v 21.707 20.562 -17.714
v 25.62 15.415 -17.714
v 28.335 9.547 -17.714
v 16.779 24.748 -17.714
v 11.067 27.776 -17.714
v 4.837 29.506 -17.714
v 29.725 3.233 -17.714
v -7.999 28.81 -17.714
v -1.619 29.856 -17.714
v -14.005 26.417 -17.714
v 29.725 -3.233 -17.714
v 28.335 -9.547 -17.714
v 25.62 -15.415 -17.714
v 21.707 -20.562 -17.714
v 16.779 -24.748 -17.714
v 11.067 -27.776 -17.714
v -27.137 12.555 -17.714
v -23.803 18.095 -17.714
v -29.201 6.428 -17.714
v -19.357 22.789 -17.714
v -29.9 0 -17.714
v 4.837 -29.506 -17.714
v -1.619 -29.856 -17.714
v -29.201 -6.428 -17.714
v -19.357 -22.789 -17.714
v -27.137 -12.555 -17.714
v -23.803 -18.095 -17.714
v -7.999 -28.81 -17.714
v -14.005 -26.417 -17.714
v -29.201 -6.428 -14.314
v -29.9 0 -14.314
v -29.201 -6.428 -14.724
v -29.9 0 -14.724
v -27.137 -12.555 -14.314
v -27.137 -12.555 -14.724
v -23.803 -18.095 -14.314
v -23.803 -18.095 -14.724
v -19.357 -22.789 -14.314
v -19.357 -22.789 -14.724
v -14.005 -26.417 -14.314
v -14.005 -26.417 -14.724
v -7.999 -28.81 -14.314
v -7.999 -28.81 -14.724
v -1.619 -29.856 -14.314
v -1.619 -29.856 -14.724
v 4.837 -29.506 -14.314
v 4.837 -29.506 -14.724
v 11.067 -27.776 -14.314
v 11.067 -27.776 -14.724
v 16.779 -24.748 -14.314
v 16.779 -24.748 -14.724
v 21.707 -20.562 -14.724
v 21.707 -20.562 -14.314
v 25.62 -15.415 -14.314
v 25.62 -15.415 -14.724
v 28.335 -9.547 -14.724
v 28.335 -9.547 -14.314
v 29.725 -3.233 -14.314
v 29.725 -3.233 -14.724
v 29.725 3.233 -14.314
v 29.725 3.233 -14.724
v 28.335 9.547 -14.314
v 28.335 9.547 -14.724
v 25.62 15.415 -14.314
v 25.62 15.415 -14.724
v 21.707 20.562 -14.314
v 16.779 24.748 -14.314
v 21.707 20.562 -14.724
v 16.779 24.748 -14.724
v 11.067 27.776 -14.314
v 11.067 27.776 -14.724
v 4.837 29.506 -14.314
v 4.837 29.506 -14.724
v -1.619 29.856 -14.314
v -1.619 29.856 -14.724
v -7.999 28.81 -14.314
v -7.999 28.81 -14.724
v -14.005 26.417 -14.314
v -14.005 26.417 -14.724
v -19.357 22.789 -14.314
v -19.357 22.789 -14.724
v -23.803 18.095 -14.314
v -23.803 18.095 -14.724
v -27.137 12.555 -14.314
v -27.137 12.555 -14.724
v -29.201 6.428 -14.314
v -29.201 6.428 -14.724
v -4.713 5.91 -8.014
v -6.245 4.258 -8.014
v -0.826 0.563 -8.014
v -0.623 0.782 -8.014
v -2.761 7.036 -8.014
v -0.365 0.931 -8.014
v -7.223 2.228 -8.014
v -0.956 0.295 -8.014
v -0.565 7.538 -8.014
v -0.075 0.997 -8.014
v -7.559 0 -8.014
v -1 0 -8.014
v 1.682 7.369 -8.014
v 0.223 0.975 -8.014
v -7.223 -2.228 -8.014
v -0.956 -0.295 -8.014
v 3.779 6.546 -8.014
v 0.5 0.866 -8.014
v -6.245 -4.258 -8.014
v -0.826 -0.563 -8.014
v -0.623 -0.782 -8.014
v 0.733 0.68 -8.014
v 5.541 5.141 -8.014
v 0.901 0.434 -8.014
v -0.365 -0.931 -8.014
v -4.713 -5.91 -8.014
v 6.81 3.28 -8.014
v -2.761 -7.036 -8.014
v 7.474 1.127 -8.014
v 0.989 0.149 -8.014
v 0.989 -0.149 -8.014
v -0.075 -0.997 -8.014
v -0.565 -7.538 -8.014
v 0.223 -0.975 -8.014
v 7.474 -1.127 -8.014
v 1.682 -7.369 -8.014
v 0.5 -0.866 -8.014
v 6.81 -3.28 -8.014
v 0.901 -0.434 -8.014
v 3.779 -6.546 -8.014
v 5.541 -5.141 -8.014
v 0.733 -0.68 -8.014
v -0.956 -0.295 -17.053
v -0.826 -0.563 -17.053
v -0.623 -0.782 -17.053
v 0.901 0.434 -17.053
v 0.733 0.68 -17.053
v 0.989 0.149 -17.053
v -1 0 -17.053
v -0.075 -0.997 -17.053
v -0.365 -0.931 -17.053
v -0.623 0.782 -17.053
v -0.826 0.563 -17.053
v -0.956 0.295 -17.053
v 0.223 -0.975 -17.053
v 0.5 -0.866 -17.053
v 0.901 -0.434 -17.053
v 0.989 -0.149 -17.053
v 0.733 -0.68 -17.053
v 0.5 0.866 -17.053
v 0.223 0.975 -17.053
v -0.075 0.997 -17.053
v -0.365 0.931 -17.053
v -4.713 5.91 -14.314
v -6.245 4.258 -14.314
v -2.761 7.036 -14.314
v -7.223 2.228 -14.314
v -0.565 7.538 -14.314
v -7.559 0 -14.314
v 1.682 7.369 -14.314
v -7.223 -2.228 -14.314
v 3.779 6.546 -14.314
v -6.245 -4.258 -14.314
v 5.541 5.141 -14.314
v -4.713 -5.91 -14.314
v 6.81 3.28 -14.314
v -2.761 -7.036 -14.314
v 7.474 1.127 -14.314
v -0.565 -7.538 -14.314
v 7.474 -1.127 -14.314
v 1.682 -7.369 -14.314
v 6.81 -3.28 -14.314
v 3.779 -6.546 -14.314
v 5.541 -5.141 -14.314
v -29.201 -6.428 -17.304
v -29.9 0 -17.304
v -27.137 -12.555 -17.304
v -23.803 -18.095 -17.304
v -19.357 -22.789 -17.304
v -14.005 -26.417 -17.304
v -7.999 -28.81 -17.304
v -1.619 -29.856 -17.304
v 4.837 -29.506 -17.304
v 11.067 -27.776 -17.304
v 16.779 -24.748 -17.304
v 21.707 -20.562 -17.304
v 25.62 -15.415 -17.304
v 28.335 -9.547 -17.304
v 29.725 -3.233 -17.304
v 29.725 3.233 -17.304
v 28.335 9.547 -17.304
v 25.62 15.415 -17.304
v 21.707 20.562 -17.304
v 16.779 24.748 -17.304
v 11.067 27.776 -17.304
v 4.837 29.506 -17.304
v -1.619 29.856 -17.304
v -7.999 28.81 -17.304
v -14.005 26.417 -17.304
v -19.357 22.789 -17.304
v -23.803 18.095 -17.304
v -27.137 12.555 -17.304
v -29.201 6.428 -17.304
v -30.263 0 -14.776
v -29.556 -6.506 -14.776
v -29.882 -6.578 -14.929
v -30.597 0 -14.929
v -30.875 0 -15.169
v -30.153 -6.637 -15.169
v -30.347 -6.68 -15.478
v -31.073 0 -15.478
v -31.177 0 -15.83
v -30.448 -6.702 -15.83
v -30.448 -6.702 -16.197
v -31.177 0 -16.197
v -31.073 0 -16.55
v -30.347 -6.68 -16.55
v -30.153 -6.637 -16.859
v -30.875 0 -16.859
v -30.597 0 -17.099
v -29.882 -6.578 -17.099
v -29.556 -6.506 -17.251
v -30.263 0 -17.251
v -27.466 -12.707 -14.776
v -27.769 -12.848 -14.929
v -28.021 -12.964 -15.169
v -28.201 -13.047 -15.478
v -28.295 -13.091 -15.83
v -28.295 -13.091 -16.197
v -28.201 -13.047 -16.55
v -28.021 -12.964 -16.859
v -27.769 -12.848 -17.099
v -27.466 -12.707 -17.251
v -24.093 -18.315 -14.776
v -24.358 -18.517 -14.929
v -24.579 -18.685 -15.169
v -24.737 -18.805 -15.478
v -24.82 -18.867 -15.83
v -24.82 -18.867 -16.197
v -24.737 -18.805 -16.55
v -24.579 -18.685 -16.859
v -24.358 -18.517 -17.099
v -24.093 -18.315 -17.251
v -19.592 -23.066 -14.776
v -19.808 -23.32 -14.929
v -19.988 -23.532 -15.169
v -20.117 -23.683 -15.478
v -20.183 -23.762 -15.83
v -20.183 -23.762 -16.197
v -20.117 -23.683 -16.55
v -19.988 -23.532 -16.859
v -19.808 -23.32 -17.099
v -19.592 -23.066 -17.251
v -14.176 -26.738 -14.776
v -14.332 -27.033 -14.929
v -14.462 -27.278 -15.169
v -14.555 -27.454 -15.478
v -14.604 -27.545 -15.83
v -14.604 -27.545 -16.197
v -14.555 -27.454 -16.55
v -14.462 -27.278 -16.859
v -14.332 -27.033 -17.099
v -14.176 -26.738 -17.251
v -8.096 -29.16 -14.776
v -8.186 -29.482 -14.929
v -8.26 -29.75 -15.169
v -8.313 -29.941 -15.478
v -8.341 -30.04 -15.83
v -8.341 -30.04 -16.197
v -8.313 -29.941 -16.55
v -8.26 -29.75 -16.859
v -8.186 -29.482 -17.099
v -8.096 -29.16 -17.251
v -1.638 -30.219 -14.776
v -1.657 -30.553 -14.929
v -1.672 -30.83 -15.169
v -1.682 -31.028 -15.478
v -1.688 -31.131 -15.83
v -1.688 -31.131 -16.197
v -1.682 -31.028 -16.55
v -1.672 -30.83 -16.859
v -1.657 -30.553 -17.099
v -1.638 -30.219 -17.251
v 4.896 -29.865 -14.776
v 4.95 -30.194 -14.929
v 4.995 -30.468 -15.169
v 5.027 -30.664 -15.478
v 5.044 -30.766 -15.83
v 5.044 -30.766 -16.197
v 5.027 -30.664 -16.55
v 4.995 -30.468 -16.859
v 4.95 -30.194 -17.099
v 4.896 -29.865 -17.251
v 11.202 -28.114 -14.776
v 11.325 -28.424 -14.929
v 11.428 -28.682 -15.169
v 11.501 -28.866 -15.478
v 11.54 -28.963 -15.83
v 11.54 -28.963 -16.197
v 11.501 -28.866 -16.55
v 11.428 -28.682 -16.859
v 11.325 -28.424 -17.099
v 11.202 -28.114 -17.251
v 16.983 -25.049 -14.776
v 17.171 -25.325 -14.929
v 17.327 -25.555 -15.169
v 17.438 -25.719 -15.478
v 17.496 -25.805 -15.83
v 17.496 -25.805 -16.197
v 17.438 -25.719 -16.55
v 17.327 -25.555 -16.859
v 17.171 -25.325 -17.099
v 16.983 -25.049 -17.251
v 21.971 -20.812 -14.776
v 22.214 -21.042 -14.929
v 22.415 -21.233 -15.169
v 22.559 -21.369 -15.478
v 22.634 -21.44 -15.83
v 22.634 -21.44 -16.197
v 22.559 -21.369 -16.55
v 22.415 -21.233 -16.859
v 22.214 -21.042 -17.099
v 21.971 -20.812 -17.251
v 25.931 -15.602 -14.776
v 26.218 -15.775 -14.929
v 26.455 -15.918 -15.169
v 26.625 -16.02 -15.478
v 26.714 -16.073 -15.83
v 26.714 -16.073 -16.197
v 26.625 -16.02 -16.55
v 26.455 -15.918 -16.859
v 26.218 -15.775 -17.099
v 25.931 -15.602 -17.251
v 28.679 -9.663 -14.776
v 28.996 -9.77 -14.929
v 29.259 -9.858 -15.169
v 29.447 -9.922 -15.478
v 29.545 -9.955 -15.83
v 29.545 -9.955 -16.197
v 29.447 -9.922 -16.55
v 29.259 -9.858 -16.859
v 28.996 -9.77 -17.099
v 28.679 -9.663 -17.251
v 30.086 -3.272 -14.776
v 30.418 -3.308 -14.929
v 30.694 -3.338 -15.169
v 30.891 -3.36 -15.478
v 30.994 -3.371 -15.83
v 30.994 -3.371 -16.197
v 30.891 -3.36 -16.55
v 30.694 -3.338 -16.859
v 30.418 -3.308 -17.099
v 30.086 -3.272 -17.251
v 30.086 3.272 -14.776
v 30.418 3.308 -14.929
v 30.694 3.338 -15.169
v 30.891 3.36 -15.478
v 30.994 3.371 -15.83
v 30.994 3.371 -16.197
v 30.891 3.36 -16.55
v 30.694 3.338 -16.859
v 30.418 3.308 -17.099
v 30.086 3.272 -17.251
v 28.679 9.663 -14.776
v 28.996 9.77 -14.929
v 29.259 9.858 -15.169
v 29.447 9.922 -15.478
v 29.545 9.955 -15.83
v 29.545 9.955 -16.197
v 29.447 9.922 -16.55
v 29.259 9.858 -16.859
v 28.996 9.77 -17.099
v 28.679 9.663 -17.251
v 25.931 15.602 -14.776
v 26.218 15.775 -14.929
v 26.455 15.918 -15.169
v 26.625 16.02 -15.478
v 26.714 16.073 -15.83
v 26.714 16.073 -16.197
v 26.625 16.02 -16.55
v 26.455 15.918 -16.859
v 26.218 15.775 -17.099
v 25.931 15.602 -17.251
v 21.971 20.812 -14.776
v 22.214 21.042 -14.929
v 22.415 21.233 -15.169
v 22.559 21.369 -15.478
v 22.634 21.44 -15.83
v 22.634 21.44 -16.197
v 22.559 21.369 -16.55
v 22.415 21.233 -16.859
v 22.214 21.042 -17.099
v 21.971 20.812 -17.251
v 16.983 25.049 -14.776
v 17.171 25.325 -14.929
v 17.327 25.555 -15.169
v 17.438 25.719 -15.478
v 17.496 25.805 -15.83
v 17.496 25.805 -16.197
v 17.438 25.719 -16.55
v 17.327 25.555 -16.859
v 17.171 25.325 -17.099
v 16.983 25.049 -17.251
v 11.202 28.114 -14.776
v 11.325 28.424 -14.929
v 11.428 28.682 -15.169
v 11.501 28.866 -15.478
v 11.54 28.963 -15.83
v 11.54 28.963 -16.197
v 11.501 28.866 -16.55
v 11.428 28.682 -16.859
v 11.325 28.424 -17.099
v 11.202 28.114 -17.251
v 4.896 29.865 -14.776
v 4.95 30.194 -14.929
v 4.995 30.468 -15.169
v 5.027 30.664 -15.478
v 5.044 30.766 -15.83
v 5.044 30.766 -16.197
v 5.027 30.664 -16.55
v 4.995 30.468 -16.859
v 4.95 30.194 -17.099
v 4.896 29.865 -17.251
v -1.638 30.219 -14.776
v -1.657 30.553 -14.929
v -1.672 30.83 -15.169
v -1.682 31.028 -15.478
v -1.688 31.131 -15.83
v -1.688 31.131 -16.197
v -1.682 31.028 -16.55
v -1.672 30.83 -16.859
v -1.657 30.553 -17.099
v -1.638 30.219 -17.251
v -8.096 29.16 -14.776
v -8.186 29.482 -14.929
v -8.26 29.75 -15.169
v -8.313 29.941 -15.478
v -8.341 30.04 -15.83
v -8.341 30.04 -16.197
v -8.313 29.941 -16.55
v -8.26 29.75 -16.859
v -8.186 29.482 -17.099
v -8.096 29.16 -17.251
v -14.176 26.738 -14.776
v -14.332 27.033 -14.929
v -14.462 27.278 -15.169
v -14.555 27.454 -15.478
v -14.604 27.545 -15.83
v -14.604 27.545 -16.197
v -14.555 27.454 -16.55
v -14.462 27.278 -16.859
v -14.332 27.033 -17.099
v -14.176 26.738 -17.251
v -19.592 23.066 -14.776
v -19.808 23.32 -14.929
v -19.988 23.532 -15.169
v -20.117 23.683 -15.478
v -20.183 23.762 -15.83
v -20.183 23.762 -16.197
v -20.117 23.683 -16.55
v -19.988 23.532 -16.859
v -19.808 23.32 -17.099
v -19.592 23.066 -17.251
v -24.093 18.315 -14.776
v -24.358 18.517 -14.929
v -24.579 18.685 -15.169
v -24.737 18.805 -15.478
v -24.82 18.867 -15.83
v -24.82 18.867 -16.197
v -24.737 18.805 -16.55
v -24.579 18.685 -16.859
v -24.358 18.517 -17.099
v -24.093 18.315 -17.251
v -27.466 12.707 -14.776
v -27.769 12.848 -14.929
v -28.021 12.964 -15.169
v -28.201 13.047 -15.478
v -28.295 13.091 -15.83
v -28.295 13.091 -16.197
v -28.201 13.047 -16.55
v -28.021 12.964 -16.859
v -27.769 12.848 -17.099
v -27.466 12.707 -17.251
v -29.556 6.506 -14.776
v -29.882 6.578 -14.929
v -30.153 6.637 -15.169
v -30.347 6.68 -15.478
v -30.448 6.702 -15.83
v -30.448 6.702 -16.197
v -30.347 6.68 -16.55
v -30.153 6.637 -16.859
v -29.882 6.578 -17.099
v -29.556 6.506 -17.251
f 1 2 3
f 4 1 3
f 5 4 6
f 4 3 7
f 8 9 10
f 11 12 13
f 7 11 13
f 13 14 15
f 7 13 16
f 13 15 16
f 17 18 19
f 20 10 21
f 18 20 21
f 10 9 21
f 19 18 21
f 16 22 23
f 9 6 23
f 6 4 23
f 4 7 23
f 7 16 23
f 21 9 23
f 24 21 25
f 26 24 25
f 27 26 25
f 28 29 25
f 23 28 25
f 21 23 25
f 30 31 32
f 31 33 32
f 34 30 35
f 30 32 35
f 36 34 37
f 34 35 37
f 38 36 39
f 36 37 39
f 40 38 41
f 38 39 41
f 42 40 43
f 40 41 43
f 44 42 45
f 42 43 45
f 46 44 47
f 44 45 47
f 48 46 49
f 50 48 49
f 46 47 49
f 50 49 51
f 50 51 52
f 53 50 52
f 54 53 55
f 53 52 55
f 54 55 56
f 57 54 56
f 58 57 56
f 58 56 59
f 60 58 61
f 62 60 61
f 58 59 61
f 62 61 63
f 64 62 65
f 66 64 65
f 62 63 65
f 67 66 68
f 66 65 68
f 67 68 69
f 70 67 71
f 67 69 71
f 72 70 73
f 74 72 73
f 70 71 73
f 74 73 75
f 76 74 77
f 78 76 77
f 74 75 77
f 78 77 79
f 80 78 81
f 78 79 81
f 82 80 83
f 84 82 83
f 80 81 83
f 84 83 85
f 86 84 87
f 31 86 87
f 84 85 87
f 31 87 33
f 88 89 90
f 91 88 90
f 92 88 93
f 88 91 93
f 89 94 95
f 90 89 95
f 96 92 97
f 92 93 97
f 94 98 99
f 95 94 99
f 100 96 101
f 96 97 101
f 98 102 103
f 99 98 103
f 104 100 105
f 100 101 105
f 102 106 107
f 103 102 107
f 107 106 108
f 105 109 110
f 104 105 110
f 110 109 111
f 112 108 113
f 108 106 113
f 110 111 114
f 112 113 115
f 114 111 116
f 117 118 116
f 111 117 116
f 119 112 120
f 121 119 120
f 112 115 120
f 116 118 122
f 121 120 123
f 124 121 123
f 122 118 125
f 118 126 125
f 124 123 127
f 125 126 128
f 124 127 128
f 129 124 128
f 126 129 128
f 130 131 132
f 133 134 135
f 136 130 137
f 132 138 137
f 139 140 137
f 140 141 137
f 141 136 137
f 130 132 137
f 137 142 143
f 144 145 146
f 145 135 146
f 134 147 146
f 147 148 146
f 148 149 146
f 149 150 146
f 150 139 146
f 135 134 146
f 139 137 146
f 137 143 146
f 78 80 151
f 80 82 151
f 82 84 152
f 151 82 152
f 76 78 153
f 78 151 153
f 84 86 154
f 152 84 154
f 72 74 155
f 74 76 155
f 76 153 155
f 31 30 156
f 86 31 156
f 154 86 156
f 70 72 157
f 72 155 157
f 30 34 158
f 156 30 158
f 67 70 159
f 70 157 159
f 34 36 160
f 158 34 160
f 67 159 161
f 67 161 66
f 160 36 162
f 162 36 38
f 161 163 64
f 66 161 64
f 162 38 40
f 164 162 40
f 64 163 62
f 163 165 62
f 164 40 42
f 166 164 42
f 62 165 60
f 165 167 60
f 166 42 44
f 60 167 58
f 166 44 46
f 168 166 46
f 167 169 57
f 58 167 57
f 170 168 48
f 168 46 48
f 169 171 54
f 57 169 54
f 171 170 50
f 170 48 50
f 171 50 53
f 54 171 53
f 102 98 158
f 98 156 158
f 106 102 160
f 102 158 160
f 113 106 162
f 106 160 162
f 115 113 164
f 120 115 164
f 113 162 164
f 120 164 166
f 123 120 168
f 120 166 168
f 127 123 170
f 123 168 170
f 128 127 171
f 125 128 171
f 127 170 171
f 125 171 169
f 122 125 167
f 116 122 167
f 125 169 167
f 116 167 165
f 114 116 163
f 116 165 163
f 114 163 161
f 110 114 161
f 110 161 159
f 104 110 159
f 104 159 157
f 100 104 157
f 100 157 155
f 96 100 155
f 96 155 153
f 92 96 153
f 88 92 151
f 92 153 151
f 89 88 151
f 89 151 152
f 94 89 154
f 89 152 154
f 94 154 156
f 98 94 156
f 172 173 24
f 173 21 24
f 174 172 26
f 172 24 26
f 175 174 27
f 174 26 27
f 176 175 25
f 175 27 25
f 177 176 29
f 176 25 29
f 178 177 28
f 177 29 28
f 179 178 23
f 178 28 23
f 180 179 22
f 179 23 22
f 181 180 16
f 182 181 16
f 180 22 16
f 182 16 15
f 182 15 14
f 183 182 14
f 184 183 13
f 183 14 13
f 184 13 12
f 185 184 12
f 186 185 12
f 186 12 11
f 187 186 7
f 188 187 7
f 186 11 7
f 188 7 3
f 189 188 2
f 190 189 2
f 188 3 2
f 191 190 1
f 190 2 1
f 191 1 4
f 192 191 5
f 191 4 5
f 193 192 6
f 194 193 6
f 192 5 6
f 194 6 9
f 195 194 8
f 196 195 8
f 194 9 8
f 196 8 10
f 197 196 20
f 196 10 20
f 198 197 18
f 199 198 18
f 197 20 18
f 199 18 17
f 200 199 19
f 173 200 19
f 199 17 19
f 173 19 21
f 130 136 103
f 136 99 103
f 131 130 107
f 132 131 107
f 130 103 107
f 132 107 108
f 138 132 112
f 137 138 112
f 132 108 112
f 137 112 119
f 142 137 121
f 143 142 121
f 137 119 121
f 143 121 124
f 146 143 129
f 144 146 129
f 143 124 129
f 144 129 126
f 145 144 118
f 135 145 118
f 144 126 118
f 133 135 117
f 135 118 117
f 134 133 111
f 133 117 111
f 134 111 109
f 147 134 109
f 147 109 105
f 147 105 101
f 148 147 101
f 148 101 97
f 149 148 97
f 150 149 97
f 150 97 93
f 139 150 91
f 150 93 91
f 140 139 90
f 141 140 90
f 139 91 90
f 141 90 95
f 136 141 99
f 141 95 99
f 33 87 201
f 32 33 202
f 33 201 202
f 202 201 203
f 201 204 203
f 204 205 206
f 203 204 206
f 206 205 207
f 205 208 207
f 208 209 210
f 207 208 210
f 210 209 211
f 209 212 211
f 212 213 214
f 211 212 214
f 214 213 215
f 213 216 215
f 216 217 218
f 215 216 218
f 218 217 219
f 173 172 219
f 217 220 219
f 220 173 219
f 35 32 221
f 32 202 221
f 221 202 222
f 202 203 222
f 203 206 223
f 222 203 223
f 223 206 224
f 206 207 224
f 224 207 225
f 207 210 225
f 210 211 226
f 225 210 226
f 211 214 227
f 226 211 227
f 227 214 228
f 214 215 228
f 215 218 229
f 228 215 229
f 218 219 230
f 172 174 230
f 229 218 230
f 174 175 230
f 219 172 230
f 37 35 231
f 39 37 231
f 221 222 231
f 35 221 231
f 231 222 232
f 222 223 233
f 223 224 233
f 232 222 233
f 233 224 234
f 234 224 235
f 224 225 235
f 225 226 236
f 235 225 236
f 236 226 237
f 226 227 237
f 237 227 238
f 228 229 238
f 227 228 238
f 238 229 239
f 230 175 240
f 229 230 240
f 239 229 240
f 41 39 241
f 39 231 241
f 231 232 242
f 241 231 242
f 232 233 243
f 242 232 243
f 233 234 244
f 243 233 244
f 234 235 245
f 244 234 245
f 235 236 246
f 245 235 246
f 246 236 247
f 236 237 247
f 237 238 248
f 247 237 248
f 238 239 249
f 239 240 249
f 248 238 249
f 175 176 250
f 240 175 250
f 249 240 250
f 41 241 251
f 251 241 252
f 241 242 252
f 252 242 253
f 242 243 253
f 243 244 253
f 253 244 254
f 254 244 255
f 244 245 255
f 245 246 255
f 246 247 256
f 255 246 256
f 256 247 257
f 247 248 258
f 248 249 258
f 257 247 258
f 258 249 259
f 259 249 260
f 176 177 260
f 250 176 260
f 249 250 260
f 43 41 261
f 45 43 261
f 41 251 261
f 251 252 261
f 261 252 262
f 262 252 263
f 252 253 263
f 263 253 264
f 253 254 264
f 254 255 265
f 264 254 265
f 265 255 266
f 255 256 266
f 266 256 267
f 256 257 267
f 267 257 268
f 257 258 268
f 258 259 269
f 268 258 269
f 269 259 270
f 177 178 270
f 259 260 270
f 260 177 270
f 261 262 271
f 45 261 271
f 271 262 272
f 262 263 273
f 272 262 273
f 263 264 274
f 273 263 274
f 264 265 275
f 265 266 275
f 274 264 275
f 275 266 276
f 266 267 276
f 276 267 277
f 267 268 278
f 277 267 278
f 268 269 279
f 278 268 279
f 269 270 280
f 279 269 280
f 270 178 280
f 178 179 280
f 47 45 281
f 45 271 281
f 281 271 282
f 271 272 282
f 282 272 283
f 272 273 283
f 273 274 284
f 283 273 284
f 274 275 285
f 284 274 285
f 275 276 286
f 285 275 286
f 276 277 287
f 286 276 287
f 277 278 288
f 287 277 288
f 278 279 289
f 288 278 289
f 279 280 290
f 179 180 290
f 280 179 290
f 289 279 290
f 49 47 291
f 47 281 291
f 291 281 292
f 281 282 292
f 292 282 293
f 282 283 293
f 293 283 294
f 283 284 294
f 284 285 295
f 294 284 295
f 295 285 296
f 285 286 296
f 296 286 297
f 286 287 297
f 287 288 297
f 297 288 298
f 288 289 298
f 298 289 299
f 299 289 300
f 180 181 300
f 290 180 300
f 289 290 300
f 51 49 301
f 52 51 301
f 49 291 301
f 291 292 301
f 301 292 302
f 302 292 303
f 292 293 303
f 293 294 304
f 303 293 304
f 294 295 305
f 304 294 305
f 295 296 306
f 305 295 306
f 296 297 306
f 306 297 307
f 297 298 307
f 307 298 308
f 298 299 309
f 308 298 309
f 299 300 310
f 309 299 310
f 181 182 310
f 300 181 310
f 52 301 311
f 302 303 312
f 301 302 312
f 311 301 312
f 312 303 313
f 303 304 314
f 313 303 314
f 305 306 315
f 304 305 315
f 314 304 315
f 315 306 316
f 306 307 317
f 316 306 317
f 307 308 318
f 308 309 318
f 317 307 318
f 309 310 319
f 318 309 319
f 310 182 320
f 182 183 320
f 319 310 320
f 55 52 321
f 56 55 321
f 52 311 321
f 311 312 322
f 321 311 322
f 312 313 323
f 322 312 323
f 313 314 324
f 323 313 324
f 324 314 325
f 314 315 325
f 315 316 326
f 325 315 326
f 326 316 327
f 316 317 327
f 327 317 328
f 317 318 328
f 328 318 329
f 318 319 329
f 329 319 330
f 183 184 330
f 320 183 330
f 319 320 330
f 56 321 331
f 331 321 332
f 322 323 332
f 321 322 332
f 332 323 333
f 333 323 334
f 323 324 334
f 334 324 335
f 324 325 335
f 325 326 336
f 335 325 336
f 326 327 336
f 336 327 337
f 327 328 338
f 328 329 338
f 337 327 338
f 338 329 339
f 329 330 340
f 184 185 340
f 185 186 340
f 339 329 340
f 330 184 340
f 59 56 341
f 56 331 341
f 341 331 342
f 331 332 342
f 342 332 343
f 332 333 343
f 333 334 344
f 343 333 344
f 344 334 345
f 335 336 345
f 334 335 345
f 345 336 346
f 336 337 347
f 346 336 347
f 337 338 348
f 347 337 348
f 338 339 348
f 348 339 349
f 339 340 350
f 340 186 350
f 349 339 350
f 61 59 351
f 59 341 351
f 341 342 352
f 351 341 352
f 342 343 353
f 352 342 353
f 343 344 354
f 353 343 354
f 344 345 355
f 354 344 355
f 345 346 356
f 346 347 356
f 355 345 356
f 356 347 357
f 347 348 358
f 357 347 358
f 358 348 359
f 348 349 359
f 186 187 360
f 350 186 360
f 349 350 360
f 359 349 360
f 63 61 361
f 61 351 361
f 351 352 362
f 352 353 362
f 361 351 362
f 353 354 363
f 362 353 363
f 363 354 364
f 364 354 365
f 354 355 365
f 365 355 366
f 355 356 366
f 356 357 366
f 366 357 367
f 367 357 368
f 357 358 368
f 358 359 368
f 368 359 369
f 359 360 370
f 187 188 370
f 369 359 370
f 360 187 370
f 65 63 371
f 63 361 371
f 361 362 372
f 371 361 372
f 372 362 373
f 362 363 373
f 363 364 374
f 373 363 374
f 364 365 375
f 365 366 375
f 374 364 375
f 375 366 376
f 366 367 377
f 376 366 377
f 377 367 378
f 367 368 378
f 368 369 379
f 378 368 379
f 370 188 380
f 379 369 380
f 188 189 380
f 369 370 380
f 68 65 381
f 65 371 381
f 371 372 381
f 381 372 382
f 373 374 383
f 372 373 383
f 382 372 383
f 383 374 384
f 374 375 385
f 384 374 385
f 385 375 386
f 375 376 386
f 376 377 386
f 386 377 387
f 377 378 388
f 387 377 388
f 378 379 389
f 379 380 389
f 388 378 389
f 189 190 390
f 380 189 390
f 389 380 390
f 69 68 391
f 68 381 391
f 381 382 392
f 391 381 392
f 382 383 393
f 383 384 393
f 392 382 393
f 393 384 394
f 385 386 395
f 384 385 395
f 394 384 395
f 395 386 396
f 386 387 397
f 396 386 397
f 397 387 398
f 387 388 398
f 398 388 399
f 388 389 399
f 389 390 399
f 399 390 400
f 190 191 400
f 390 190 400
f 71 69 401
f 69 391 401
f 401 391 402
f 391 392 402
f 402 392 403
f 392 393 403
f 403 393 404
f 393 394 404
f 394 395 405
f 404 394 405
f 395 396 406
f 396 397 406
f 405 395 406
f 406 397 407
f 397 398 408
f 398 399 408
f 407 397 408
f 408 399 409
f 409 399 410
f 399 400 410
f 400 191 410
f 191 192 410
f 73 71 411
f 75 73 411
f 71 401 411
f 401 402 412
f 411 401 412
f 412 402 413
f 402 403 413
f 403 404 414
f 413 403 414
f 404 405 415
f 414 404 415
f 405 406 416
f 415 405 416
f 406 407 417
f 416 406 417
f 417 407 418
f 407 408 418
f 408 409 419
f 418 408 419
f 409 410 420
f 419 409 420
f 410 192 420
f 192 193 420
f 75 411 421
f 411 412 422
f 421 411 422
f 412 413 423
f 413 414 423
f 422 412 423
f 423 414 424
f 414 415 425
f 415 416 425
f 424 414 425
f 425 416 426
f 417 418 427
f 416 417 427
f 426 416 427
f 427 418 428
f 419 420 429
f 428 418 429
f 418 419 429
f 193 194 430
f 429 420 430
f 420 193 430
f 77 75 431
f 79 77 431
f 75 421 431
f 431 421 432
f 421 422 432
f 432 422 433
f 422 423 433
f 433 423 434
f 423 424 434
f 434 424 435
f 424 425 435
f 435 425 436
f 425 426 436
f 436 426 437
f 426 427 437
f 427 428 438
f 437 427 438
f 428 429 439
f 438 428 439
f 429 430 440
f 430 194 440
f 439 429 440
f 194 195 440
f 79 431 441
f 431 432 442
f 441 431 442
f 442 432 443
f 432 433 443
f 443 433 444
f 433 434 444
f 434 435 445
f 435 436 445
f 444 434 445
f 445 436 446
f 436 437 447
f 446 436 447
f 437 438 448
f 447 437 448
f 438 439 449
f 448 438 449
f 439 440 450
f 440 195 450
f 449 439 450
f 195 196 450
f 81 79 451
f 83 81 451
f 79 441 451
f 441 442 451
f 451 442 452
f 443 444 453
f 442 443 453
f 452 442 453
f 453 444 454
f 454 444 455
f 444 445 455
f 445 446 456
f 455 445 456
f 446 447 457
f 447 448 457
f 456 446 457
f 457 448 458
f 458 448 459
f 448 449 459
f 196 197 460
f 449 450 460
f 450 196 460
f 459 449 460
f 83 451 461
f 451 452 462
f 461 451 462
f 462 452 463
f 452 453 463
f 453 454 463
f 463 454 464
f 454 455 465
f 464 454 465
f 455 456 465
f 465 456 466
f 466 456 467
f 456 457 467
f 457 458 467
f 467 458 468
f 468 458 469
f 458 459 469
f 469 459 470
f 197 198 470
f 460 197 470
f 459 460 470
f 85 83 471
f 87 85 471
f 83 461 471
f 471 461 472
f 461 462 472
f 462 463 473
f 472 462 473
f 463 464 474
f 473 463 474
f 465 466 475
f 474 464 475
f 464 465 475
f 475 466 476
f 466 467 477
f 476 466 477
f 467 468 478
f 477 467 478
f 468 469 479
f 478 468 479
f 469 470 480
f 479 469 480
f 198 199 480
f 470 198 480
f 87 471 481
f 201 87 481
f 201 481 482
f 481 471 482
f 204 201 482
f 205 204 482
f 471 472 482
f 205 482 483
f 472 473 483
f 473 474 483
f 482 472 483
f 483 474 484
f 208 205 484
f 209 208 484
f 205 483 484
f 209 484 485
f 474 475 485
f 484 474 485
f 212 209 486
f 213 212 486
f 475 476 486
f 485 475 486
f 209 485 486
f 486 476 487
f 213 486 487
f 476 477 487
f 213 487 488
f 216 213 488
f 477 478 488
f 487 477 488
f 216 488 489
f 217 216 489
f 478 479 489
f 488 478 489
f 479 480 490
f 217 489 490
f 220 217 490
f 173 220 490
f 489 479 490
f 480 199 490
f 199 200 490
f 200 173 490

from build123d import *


with BuildPart() as part:
    # Esquisse1 → Révolution1 (revolve)
    with BuildSketch(Plane(origin=(0, 0, 0), x_dir=(1, 0, 0), z_dir=(0, 1, 0)), mode=Mode.PRIVATE) as r_volution1_sk:
        with BuildLine():
            Line((29.9, 17.303746522), (29.9, 17.713746522))
            Line((29.9, 17.713746522), (0, 17.713746522))
            Line((0, 17.713746522), (0, 17.052896028))
            Line((0, 17.052896028), (1, 17.052896028))
            Line((1, 17.052896028), (1, 8.013746522))
            Line((1, 8.013746522), (7.558685201, 8.013746522))
            Line((7.558685201, 8.013746522), (7.558685201, 14.313746522))
            Line((7.558685201, 14.313746522), (29.9, 14.313746522))
            Line((29.9, 14.313746522), (29.9, 14.723746522))
            ThreePointArc((29.9, 14.723746522), (31.19, 16.013746522), (29.9, 17.303746522))
        make_face()
    revolve(r_volution1_sk.sketch.rotate(Axis((0, 0, -20.028610737), (0, 0, 1)), 180), axis=Axis((0, 0, -20.028610737), (0, 0, 1)))


solid = part.part
